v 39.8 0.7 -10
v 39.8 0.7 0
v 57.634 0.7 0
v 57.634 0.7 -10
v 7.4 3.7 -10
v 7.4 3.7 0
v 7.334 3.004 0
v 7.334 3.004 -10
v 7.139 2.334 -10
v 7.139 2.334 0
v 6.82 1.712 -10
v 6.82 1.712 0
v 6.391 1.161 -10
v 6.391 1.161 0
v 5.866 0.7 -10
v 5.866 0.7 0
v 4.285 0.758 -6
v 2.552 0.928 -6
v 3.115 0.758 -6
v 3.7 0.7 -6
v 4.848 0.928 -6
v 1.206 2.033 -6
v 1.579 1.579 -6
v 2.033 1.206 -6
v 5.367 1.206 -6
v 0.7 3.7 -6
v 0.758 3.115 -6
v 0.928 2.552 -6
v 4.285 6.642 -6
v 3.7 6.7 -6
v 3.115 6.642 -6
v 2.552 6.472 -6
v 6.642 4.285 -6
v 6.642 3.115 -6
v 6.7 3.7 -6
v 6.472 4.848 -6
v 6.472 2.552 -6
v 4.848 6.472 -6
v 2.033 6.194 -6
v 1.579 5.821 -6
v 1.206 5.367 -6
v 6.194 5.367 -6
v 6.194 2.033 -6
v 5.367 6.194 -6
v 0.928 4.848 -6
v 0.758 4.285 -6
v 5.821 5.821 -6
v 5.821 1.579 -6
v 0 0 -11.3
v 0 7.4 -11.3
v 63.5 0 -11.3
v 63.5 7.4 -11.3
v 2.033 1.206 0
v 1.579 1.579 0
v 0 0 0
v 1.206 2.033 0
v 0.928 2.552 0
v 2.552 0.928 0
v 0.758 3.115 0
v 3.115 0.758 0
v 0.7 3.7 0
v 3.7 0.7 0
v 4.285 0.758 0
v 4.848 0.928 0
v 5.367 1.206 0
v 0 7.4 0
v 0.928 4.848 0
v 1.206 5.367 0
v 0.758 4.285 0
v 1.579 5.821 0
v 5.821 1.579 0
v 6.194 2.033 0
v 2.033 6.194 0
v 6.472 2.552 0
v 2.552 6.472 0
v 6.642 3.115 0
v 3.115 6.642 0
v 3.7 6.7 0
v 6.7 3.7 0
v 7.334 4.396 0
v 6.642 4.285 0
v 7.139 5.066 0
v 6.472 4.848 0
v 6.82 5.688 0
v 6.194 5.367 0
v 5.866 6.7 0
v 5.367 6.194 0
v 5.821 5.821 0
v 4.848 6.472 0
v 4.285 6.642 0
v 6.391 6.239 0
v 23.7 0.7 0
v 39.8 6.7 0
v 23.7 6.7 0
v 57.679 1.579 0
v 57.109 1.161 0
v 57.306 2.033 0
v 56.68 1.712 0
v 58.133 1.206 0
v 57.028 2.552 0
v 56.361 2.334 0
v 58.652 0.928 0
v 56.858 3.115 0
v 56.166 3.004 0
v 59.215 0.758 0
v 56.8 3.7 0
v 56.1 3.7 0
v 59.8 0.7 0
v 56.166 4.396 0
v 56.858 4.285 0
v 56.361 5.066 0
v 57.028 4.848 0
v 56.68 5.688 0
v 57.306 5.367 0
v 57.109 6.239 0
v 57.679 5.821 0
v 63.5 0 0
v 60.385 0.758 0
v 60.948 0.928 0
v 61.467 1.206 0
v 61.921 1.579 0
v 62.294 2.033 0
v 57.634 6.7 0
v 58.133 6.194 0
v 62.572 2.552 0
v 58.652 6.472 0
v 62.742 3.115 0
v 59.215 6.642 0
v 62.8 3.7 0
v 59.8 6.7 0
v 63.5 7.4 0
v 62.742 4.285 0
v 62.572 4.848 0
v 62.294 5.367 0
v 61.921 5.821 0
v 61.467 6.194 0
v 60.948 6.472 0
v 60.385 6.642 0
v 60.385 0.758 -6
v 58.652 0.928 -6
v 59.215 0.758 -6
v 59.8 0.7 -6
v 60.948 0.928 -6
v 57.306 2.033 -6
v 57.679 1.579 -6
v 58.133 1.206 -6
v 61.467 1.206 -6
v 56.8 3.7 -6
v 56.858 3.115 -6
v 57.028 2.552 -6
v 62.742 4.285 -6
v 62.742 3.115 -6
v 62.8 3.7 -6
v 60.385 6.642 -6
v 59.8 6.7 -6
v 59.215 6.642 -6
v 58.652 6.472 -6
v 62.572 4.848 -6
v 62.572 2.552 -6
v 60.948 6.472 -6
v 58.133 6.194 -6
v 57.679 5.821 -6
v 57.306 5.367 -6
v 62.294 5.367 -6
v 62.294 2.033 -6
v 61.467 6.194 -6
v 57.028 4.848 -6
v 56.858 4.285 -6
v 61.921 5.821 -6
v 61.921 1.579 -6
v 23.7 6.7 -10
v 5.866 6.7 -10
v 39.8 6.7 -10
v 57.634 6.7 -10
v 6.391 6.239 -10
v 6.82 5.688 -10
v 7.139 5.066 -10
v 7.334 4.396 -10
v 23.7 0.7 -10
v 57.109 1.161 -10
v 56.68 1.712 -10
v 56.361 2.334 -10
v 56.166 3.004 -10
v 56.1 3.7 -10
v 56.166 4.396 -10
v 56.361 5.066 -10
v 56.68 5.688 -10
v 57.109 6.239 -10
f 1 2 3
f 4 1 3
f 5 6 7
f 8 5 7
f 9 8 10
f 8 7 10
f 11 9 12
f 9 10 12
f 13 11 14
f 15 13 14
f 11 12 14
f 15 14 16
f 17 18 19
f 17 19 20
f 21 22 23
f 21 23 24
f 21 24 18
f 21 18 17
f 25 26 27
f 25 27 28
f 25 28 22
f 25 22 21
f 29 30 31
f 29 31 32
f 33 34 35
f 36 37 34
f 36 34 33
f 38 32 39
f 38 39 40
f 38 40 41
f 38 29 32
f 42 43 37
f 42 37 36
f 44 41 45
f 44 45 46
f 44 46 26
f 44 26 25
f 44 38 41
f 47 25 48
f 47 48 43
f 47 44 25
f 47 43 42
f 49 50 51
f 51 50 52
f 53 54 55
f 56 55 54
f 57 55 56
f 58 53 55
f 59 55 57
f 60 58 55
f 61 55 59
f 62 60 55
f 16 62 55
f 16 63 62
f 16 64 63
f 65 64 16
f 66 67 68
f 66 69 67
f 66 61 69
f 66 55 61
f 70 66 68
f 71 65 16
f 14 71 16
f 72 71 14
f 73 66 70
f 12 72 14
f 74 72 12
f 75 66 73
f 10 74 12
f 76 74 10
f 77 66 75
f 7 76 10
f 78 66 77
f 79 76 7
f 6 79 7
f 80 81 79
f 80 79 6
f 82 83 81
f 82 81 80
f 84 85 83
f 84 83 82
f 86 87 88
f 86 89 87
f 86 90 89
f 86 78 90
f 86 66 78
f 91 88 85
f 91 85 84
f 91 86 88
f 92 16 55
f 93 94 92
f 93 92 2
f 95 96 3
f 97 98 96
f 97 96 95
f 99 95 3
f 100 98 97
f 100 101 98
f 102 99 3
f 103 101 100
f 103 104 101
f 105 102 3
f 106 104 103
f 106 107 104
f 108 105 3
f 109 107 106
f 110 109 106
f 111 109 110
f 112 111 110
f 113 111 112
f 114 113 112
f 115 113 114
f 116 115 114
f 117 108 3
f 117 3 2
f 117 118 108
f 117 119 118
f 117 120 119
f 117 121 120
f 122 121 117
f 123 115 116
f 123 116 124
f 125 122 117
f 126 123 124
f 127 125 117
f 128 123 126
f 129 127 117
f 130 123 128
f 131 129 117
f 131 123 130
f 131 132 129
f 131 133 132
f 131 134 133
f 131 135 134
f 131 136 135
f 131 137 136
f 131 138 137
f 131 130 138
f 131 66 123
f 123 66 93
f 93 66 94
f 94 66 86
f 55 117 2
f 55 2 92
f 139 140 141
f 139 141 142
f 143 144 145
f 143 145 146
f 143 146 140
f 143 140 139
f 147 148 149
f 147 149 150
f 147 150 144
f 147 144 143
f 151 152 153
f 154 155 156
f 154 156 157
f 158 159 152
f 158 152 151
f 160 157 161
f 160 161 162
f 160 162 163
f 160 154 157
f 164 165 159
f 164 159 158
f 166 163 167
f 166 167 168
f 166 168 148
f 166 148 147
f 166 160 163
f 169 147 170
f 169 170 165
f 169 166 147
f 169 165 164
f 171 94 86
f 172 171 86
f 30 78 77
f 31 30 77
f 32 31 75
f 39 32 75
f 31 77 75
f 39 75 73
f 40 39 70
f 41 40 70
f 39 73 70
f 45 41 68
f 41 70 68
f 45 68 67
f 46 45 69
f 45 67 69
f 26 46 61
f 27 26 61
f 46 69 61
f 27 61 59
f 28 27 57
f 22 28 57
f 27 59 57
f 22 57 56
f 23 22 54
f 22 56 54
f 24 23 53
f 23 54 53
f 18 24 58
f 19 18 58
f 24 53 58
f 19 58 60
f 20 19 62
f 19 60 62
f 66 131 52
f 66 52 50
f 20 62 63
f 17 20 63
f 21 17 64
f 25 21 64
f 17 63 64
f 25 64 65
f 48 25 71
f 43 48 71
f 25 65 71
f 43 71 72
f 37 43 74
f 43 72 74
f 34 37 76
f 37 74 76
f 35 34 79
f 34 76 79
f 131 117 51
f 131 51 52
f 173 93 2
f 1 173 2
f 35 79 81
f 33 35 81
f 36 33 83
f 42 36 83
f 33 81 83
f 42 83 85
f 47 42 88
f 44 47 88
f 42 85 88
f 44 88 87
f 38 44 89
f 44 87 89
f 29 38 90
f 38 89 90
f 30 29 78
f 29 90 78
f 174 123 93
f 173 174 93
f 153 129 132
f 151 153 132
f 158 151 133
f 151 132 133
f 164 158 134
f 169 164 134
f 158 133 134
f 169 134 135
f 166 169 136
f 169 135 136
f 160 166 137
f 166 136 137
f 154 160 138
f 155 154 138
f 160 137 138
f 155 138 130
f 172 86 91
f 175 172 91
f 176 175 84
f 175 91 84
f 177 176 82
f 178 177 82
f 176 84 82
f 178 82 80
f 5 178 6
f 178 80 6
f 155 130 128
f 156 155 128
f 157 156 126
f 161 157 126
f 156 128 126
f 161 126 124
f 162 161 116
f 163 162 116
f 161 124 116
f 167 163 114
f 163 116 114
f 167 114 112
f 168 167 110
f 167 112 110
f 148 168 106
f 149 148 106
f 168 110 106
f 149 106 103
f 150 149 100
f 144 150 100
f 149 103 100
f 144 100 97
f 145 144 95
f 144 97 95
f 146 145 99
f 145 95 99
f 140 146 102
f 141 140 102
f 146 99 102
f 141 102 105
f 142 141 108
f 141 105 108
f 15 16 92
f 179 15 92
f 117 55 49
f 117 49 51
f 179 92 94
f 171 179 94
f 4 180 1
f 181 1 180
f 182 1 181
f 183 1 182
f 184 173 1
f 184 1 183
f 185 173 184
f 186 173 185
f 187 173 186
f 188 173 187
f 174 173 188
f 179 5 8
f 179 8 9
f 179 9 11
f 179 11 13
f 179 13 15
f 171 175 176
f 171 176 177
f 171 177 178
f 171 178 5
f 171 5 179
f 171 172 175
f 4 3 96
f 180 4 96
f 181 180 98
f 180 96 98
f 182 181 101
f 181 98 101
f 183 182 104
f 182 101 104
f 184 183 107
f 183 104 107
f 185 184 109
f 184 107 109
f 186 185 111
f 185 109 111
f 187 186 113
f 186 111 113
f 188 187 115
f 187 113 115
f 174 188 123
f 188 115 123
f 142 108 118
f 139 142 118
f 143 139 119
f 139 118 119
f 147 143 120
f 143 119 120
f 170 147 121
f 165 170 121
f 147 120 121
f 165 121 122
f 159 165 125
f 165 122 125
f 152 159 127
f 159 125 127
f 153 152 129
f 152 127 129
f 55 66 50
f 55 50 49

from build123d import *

# Parameters (mm, degrees)
F0_W     = 16.1
F0_H     = 6
F1_DEPTH = 11.3
F2_DEPTH = 6
F3_DEPTH = 10


with BuildPart() as f1:
    # F0 (on Top) → F1 (new body)
    with BuildSketch(Plane.XY):
        with BuildLine():
            Line((59.8, 7.4), (3.7, 7.4))
            ThreePointArc((3.7, 7.4), (4.837981, 7.220653), (5.865641, 6.7))
            Line((5.865641, 6.7), (23.7, 6.7))
            Line((23.7, 6.7), (39.8, 6.7))
            Line((39.8, 6.7), (57.634359, 6.7))
            ThreePointArc((57.634359, 6.7), (58.662019, 7.220653), (59.8, 7.4))
        make_face()
        with BuildLine():
            ThreePointArc((57.634359, 6.7), (56.1, 3.7), (57.634359, 0.7))
            Line((57.634359, 0.7), (59.8, 0.7))
            ThreePointArc((59.8, 0.7), (56.8, 3.7), (59.8, 6.7))
            Line((59.8, 6.7), (57.634359, 6.7))
        make_face()
        with BuildLine():
            ThreePointArc((59.8, 7.4), (62.416295, 6.316295), (63.5, 3.7))
            Line((63.5, 3.7), (63.5, 7.4))
            Line((63.5, 7.4), (59.8, 7.4))
        make_face()
        with BuildLine():
            ThreePointArc((63.5, 3.7), (62.416295, 1.083705), (59.8, 0))
            Line((59.8, 0), (63.5, 0))
            Line((63.5, 0), (63.5, 3.7))
        make_face()
        with BuildLine():
            ThreePointArc((5.865641, 0.7), (4.837981, 0.179347), (3.7, 0))
            Line((3.7, 0), (59.8, 0))
            ThreePointArc((59.8, 0), (58.662019, 0.179347), (57.634359, 0.7))
            Line((57.634359, 0.7), (39.8, 0.7))
            Line((39.8, 0.7), (23.7, 0.7))
            Line((23.7, 0.7), (5.865641, 0.7))
        make_face()
        with BuildLine():
            ThreePointArc((57.634359, 0.7), (58.662019, 0.179347), (59.8, 0))
            ThreePointArc((59.8, 0), (62.416295, 1.083705), (63.5, 3.7))
            ThreePointArc((63.5, 3.7), (62.416295, 6.316295), (59.8, 7.4))
            ThreePointArc((59.8, 7.4), (58.662019, 7.220653), (57.634359, 6.7))
            Line((57.634359, 6.7), (59.8, 6.7))
            ThreePointArc((59.8, 6.7), (61.92132, 5.82132), (62.8, 3.7))
            ThreePointArc((62.8, 3.7), (61.92132, 1.57868), (59.8, 0.7))
            Line((59.8, 0.7), (57.634359, 0.7))
        make_face()
        with Locations((31.75, 3.7)):
            Rectangle(F0_W, F0_H)
        with BuildLine():
            ThreePointArc((0, 3.7), (1.083705, 1.083705), (3.7, 0))
            ThreePointArc((3.7, 0), (4.837981, 0.179347), (5.865641, 0.7))
            Line((5.865641, 0.7), (3.7, 0.7))
            ThreePointArc((3.7, 0.7), (0.7, 3.7), (3.7, 6.7))
            Line((3.7, 6.7), (5.865641, 6.7))
            ThreePointArc((5.865641, 6.7), (4.837981, 7.220653), (3.7, 7.4))
            ThreePointArc((3.7, 7.4), (1.083705, 6.316295), (0, 3.7))
        make_face()
        with BuildLine():
            Line((3.7, 0.7), (5.865641, 0.7))
            ThreePointArc((5.865641, 0.7), (6.994152, 2.015196), (7.4, 3.7))
            ThreePointArc((7.4, 3.7), (6.994152, 5.384804), (5.865641, 6.7))
            Line((5.865641, 6.7), (3.7, 6.7))
            ThreePointArc((3.7, 6.7), (5.82132, 5.82132), (6.7, 3.7))
            ThreePointArc((6.7, 3.7), (5.82132, 1.57868), (3.7, 0.7))
        make_face()
        with BuildLine():
            Line((0, 7.4), (0, 3.7))
            ThreePointArc((0, 3.7), (1.083705, 6.316295), (3.7, 7.4))
            Line((3.7, 7.4), (0, 7.4))
        make_face()
        with BuildLine():
            Line((0, 3.7), (0, 0))
            Line((0, 0), (3.7, 0))
            ThreePointArc((3.7, 0), (1.083705, 1.083705), (0, 3.7))
        make_face()
        with BuildLine():
            ThreePointArc((3.7, 6.7), (0.7, 3.7), (3.7, 0.7))
            ThreePointArc((3.7, 0.7), (5.82132, 1.57868), (6.7, 3.7))
            ThreePointArc((6.7, 3.7), (5.82132, 5.82132), (3.7, 6.7))
        make_face()
        with BuildLine():
            ThreePointArc((7.4, 3.7), (6.994152, 2.015196), (5.865641, 0.7))
            Line((5.865641, 0.7), (23.7, 0.7))
            Line((23.7, 0.7), (23.7, 6.7))
            Line((23.7, 6.7), (5.865641, 6.7))
            ThreePointArc((5.865641, 6.7), (6.994152, 5.384804), (7.4, 3.7))
        make_face()
        with BuildLine():
            Line((39.8, 0.7), (57.634359, 0.7))
            ThreePointArc((57.634359, 0.7), (56.1, 3.7), (57.634359, 6.7))
            Line((57.634359, 6.7), (39.8, 6.7))
            Line((39.8, 6.7), (39.8, 0.7))
        make_face()
        with BuildLine():
            ThreePointArc((59.8, 6.7), (56.8, 3.7), (59.8, 0.7))
            ThreePointArc((59.8, 0.7), (61.92132, 1.57868), (62.8, 3.7))
            ThreePointArc((62.8, 3.7), (61.92132, 5.82132), (59.8, 6.7))
        make_face()
    extrude(amount=-F1_DEPTH)

    # F0 (on Top) → F2 (cut)
    with BuildSketch(Plane.XY):
        with BuildLine():
            ThreePointArc((3.7, 6.7), (0.7, 3.7), (3.7, 0.7))
            ThreePointArc((3.7, 0.7), (5.82132, 1.57868), (6.7, 3.7))
            ThreePointArc((6.7, 3.7), (5.82132, 5.82132), (3.7, 6.7))
        make_face()
        with BuildLine():
            ThreePointArc((59.8, 6.7), (56.8, 3.7), (59.8, 0.7))
            ThreePointArc((59.8, 0.7), (61.92132, 1.57868), (62.8, 3.7))
            ThreePointArc((62.8, 3.7), (61.92132, 5.82132), (59.8, 6.7))
        make_face()
    extrude(amount=-F2_DEPTH, mode=Mode.SUBTRACT)

    # F0 (on Top) → F3 (cut)
    with BuildSketch(Plane.XY):
        with BuildLine():
            ThreePointArc((7.4, 3.7), (6.994152, 2.015196), (5.865641, 0.7))
            Line((5.865641, 0.7), (23.7, 0.7))
            Line((23.7, 0.7), (23.7, 6.7))
            Line((23.7, 6.7), (5.865641, 6.7))
            ThreePointArc((5.865641, 6.7), (6.994152, 5.384804), (7.4, 3.7))
        make_face()
        with BuildLine():
            Line((39.8, 0.7), (57.634359, 0.7))
            ThreePointArc((57.634359, 0.7), (56.1, 3.7), (57.634359, 6.7))
            Line((57.634359, 6.7), (39.8, 6.7))
            Line((39.8, 6.7), (39.8, 0.7))
        make_face()
    extrude(amount=-F3_DEPTH, mode=Mode.SUBTRACT)


solid = f1.part
